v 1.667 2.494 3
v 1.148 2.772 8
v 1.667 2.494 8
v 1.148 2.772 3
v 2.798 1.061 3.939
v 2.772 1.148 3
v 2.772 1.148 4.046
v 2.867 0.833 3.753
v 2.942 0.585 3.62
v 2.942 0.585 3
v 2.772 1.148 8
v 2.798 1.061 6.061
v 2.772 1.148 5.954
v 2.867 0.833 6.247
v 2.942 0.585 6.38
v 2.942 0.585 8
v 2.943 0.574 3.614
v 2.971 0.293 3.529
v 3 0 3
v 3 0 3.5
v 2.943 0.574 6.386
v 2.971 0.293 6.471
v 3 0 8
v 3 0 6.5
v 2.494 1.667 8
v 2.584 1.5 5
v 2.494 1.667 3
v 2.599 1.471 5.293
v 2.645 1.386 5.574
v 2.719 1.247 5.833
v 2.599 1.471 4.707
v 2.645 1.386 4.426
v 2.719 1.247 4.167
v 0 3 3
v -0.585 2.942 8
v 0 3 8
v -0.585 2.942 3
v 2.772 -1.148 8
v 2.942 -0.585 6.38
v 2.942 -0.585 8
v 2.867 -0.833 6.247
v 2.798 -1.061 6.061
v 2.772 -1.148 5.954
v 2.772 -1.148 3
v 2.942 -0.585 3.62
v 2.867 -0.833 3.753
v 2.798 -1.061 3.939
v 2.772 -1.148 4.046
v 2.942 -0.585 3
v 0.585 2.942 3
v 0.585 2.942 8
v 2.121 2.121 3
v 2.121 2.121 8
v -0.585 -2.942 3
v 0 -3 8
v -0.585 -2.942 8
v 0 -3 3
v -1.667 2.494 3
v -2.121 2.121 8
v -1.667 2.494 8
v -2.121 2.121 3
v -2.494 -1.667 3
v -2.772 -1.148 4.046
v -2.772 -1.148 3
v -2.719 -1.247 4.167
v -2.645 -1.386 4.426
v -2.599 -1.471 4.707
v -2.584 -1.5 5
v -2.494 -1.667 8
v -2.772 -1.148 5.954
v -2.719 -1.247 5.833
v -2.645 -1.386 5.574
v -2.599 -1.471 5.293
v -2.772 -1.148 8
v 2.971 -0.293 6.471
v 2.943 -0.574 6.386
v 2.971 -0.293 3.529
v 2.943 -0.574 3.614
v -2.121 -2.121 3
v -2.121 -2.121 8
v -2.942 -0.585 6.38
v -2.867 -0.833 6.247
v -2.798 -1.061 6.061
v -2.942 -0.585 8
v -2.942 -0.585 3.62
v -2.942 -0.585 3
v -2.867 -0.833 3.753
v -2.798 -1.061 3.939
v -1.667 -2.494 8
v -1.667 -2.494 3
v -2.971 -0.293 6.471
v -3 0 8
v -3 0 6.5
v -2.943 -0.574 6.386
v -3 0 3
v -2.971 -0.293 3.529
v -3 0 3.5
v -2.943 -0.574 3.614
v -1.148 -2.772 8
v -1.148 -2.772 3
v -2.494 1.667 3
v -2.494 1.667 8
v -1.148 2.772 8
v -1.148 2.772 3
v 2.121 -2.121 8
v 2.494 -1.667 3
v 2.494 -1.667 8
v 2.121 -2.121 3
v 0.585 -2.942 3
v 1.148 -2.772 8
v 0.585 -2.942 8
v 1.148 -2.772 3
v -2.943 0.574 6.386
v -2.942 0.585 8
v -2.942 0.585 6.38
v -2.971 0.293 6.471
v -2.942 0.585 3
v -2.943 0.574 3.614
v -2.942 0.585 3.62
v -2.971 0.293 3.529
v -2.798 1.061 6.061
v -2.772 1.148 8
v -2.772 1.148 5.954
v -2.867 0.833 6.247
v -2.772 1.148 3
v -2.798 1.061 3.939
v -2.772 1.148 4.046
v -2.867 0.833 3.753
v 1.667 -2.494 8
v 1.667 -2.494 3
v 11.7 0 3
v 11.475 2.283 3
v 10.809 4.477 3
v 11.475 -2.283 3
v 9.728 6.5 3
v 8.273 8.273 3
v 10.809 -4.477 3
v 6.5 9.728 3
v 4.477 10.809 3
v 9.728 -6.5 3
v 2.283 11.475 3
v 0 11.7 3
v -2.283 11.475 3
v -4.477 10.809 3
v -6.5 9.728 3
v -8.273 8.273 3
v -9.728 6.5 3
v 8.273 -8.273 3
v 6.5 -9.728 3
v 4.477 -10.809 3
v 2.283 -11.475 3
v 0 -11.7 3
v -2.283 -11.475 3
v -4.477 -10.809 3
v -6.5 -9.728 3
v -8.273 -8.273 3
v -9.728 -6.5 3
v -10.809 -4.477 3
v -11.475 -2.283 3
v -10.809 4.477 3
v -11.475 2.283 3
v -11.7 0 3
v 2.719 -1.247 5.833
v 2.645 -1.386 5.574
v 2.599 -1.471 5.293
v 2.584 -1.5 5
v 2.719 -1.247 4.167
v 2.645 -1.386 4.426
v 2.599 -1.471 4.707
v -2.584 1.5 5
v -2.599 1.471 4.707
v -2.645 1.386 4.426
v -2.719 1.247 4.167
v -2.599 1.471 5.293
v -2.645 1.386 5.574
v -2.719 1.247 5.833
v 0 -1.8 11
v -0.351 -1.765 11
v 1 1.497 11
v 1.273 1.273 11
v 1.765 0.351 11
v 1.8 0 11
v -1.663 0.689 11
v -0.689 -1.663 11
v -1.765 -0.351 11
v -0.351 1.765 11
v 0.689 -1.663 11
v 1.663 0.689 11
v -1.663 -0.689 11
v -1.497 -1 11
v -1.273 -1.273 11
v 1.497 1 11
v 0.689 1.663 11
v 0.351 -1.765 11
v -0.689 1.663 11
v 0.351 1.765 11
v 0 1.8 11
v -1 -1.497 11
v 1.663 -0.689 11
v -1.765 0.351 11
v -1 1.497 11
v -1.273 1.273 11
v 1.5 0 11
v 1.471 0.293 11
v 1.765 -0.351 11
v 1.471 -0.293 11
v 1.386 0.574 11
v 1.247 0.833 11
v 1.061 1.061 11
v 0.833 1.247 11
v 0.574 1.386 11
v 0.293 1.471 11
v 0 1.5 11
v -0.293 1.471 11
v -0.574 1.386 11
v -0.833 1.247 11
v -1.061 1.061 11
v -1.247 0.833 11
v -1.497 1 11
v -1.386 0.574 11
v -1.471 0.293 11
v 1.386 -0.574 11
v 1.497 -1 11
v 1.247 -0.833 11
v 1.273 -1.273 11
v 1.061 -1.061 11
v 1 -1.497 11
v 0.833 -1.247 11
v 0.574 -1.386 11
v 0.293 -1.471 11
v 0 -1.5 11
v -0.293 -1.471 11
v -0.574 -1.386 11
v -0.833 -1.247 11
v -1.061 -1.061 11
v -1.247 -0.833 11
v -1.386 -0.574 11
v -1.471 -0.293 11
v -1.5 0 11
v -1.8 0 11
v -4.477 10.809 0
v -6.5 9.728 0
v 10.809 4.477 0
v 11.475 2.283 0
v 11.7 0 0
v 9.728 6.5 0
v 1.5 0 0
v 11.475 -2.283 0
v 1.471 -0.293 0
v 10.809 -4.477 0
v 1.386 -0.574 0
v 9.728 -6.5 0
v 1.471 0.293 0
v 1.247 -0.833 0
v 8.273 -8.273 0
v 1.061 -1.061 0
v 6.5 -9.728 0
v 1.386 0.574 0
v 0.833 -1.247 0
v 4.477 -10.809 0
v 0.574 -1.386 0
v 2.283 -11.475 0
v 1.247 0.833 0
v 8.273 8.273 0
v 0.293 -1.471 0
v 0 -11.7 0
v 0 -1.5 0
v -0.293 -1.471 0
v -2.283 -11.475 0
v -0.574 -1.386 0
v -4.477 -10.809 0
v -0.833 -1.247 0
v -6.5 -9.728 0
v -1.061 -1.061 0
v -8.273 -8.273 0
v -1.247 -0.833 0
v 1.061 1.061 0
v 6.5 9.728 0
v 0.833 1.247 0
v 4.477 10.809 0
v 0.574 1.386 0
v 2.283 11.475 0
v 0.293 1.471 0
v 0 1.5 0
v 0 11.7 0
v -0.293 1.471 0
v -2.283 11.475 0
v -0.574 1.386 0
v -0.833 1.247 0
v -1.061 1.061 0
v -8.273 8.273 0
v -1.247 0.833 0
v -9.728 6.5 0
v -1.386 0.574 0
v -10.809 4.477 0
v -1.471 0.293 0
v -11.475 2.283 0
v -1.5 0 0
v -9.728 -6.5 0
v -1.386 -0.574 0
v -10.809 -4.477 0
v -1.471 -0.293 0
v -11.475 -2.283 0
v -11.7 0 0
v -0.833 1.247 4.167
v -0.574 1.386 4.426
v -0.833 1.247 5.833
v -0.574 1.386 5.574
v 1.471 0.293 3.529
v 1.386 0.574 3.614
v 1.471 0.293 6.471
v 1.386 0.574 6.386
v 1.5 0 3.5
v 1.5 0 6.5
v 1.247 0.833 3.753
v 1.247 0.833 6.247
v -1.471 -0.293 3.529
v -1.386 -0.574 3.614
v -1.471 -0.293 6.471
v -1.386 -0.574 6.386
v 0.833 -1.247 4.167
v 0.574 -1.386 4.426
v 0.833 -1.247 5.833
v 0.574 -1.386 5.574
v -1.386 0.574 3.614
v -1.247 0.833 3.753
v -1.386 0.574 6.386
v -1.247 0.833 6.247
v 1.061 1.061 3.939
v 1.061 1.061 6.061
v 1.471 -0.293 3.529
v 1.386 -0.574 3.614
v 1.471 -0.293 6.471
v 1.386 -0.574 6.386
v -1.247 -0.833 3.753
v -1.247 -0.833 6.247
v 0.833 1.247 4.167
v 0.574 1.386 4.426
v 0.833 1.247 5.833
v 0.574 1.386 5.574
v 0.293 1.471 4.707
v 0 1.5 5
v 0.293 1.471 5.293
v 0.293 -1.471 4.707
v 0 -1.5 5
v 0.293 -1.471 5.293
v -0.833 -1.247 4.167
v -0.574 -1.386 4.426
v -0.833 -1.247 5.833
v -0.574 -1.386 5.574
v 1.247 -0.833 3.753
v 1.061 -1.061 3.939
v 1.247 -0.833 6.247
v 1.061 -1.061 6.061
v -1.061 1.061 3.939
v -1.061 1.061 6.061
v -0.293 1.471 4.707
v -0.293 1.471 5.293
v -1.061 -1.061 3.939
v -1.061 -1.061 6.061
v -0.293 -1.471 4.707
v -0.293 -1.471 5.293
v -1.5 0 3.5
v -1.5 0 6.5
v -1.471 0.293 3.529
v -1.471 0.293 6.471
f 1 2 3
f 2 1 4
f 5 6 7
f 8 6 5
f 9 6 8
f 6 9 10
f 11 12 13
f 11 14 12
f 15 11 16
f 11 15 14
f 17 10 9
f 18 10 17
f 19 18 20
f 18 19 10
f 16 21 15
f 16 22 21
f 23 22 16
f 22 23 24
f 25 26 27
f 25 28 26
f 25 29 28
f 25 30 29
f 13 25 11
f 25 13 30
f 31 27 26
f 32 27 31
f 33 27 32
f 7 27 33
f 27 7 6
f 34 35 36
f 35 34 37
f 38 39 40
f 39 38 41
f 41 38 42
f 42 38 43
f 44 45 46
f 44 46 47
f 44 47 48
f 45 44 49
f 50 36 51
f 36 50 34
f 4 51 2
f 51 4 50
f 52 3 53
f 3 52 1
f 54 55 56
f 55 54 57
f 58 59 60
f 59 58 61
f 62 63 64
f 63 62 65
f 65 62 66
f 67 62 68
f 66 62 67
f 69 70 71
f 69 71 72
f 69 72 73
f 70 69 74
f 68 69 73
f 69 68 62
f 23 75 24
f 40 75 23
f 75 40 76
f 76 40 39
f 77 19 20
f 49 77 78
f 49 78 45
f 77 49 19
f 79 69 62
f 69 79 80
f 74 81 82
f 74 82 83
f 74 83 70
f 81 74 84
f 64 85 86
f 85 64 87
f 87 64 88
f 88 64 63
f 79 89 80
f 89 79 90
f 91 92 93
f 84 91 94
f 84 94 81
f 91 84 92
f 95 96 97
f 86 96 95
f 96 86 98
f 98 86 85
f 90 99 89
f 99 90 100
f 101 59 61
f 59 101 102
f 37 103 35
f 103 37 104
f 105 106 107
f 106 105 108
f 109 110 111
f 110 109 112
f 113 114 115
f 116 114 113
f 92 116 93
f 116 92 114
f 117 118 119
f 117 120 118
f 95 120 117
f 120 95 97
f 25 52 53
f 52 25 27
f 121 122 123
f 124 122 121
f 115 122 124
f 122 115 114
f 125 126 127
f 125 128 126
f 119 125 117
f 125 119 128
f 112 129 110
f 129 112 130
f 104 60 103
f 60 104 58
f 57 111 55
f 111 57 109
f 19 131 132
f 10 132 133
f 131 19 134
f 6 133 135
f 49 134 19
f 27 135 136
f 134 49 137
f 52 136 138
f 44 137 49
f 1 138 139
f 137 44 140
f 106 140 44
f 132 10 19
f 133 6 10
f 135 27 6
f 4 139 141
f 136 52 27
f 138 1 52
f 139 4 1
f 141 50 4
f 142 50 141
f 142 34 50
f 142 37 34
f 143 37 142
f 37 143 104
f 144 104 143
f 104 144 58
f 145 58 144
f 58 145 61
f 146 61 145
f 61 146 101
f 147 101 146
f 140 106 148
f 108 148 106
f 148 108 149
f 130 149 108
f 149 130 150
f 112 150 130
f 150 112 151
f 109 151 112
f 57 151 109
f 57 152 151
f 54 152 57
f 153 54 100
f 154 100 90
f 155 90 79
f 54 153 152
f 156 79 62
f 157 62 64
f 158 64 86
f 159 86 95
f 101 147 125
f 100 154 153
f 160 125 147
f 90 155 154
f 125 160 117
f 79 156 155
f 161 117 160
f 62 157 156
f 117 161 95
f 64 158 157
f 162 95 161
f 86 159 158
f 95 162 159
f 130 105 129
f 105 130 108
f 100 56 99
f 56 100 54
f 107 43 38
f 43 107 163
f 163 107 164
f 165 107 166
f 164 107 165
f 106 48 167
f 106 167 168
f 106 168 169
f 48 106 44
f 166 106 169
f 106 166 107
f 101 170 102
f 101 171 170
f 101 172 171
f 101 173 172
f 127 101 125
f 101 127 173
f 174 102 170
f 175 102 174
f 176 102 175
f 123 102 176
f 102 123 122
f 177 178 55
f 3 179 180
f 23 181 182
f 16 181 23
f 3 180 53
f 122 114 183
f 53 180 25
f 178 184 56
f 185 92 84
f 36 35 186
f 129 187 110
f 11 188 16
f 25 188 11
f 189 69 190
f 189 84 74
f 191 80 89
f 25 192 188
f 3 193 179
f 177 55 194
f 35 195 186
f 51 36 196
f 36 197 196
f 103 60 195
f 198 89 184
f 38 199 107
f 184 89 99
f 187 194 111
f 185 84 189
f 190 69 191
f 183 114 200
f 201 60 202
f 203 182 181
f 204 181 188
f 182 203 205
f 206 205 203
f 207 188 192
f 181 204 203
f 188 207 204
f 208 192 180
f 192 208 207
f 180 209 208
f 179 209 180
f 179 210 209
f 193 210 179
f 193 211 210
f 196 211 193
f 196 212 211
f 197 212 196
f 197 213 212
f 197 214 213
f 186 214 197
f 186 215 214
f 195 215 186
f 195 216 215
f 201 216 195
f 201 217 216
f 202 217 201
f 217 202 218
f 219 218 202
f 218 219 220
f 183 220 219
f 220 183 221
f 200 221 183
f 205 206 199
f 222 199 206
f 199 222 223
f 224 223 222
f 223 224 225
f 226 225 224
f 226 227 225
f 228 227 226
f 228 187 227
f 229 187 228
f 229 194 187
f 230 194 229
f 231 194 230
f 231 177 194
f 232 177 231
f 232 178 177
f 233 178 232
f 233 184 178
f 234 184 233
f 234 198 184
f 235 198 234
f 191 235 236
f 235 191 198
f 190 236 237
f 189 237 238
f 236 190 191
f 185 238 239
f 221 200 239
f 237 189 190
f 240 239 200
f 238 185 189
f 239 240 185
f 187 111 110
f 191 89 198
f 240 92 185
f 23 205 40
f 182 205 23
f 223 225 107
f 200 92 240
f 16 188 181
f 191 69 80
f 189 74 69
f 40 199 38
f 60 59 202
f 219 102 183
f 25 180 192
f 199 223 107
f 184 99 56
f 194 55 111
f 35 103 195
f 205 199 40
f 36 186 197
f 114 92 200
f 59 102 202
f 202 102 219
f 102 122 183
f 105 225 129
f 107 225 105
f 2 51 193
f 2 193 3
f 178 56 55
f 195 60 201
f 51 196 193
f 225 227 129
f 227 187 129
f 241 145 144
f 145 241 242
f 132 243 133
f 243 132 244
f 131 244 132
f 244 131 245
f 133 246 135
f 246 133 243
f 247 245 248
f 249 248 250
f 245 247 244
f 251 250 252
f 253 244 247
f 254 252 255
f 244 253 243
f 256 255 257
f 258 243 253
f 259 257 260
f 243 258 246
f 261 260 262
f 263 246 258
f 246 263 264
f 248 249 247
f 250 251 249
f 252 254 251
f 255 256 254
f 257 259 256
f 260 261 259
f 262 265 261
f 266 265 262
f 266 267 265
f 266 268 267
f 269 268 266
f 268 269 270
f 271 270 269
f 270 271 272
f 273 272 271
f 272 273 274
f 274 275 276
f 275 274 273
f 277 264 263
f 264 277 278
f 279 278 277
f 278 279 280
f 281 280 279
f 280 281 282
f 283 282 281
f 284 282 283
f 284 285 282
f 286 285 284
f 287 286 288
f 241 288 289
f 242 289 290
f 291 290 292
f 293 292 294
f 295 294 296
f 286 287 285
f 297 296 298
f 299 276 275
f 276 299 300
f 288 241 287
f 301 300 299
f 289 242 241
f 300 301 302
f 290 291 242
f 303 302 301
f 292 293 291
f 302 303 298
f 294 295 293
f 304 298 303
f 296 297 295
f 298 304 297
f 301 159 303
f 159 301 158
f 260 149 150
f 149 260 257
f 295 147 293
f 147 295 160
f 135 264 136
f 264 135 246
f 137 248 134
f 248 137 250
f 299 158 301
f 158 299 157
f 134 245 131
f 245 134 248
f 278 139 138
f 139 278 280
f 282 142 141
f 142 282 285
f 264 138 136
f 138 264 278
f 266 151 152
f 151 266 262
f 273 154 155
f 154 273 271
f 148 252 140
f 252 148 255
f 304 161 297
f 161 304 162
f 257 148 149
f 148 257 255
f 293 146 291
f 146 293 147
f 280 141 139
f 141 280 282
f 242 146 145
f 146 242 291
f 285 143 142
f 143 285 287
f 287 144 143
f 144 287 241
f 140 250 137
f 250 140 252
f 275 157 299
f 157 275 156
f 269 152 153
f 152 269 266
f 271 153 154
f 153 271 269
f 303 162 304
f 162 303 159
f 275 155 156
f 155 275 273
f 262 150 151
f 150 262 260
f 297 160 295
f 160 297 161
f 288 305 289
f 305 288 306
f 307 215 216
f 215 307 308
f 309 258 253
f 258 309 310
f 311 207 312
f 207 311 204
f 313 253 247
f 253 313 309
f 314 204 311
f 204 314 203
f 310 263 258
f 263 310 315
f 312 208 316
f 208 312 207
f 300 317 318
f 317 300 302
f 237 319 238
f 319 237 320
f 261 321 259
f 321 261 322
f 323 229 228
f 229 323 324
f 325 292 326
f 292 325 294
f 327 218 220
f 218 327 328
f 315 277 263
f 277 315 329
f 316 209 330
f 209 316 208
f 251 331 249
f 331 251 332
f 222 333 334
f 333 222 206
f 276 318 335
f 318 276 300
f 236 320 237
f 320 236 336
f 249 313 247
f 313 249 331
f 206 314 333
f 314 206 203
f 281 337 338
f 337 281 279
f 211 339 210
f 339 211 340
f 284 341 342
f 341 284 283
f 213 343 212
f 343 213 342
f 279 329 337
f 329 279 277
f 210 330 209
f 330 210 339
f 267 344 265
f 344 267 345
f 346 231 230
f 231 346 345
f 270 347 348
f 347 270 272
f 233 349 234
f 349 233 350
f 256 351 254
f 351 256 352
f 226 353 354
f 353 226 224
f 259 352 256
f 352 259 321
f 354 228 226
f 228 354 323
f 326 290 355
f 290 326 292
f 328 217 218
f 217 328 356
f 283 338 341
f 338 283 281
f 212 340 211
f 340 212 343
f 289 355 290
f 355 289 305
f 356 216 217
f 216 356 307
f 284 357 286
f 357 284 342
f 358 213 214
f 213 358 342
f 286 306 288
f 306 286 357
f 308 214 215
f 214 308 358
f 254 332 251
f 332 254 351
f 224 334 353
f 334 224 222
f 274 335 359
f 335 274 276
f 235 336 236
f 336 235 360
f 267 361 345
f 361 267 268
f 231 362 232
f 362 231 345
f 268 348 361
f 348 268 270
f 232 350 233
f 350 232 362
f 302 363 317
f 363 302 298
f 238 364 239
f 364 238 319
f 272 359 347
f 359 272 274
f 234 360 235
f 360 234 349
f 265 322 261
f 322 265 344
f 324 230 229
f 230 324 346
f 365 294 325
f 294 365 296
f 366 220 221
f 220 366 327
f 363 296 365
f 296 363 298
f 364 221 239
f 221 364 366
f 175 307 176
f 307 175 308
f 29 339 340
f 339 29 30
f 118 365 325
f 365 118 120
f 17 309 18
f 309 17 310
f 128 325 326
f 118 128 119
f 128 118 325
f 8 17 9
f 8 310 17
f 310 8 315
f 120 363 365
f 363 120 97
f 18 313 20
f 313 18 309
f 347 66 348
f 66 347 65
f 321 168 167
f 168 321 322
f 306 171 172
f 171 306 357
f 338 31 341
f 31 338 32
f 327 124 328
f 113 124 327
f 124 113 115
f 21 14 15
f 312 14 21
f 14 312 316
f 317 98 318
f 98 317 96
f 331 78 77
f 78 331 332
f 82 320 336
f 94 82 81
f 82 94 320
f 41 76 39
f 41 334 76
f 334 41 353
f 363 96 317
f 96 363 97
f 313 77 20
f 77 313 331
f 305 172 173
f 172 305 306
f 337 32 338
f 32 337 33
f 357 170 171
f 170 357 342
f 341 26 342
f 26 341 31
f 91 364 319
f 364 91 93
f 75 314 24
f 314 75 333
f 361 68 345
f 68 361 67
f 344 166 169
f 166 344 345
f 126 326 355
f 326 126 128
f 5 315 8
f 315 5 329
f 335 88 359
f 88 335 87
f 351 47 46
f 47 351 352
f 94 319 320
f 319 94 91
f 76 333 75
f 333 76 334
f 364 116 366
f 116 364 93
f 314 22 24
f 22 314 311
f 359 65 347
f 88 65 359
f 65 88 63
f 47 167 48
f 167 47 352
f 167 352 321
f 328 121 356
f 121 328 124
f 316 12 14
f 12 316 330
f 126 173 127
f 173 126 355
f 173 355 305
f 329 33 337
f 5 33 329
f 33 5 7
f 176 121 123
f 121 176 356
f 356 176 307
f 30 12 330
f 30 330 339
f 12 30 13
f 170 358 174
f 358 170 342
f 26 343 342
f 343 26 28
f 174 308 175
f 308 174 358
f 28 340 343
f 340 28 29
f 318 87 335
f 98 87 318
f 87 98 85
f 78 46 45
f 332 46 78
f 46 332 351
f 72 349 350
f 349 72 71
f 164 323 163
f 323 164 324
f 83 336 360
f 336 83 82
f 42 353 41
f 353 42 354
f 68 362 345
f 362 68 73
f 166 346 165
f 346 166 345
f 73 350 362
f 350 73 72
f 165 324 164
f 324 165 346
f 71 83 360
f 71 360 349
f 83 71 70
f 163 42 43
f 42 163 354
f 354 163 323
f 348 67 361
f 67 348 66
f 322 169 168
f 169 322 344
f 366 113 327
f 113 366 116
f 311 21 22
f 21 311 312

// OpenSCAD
// file: ../stamp_generated.scad
// Defaults for OpenSCAD preview — overwritten by scripts/Export-OpenScadStl.ps1 on export.
// Lines: 1 brand, 2 product, 3 version (+ Prototype when preview).
info_stamp_line1 = "Verminology";
info_stamp_line2 = "Liquid Bait Station";
info_stamp_line3 = "v2.4 Prototype";
reservoir_stamp_bottom = false;
station_stamp_bottom = true;
needle_insert_export_stamp_bottom = false;
// file: needle-insert-lib.scad
// Needle insert library — include this (not `use`) so common.scad loads.
// F5 preview / STL: open needle-insert.scad or needle-insert-export.scad.
// Base disk OD = inner_bait_barrier_id (center tray hole); disk height = station floor.

include <common.scad>

module needle_insert_channels() {
    translate([0, 0, -0.5])
        cylinder(h = pin_top + 1, d = pin_channel_dia);
    translate([pin_tunnel_x_center, 0, pin_tunnel_z])
        rotate([0, 90, 0])
            cylinder(h = pin_tunnel_reach, d = pin_channel_dia, center = true);
}

// Solid: base disk + hollow pin through pin_top (no bayonet tabs).
module needle_insert() {
    sh = pin_top - pin_tip_taper_h - needle_insert_disk_h;
    render_if_needed()
        difference() {
            union() {
                cylinder(h = needle_insert_disk_h, d = needle_insert_disk_od);
                translate([0, 0, needle_insert_disk_h]) {
                    cylinder(h = sh, d = pin_dia);
                    translate([0, 0, sh])
                        cylinder(h = pin_tip_taper_h, d1 = pin_dia, d2 = pin_tip_od);
                }
            }
            needle_insert_channels();
        }
}

// Pocket: coaxial cylinder for base + pin bore; inner barrier hole ID = needle_insert_disk_od.
module needle_insert_pocket() {
    c = needle_insert_pocket_clearance;
    dh = needle_insert_disk_h;
    ze = needle_insert_pocket_z_extra;
    r_disk = needle_insert_disk_od / 2 + c;
    translate([0, 0, -0.02])
        union() {
            cylinder(h = dh + 0.02 + ze, r = r_disk);
            translate([0, 0, dh])
                cylinder(h = pin_top - dh + 0.5 + ze, d = pin_dia + 2 * c);
        }
}
// main file
// STL export entry — mesh_preview/crosssection overridden by export script.
include <needle-insert-lib.scad>

needle_insert();
